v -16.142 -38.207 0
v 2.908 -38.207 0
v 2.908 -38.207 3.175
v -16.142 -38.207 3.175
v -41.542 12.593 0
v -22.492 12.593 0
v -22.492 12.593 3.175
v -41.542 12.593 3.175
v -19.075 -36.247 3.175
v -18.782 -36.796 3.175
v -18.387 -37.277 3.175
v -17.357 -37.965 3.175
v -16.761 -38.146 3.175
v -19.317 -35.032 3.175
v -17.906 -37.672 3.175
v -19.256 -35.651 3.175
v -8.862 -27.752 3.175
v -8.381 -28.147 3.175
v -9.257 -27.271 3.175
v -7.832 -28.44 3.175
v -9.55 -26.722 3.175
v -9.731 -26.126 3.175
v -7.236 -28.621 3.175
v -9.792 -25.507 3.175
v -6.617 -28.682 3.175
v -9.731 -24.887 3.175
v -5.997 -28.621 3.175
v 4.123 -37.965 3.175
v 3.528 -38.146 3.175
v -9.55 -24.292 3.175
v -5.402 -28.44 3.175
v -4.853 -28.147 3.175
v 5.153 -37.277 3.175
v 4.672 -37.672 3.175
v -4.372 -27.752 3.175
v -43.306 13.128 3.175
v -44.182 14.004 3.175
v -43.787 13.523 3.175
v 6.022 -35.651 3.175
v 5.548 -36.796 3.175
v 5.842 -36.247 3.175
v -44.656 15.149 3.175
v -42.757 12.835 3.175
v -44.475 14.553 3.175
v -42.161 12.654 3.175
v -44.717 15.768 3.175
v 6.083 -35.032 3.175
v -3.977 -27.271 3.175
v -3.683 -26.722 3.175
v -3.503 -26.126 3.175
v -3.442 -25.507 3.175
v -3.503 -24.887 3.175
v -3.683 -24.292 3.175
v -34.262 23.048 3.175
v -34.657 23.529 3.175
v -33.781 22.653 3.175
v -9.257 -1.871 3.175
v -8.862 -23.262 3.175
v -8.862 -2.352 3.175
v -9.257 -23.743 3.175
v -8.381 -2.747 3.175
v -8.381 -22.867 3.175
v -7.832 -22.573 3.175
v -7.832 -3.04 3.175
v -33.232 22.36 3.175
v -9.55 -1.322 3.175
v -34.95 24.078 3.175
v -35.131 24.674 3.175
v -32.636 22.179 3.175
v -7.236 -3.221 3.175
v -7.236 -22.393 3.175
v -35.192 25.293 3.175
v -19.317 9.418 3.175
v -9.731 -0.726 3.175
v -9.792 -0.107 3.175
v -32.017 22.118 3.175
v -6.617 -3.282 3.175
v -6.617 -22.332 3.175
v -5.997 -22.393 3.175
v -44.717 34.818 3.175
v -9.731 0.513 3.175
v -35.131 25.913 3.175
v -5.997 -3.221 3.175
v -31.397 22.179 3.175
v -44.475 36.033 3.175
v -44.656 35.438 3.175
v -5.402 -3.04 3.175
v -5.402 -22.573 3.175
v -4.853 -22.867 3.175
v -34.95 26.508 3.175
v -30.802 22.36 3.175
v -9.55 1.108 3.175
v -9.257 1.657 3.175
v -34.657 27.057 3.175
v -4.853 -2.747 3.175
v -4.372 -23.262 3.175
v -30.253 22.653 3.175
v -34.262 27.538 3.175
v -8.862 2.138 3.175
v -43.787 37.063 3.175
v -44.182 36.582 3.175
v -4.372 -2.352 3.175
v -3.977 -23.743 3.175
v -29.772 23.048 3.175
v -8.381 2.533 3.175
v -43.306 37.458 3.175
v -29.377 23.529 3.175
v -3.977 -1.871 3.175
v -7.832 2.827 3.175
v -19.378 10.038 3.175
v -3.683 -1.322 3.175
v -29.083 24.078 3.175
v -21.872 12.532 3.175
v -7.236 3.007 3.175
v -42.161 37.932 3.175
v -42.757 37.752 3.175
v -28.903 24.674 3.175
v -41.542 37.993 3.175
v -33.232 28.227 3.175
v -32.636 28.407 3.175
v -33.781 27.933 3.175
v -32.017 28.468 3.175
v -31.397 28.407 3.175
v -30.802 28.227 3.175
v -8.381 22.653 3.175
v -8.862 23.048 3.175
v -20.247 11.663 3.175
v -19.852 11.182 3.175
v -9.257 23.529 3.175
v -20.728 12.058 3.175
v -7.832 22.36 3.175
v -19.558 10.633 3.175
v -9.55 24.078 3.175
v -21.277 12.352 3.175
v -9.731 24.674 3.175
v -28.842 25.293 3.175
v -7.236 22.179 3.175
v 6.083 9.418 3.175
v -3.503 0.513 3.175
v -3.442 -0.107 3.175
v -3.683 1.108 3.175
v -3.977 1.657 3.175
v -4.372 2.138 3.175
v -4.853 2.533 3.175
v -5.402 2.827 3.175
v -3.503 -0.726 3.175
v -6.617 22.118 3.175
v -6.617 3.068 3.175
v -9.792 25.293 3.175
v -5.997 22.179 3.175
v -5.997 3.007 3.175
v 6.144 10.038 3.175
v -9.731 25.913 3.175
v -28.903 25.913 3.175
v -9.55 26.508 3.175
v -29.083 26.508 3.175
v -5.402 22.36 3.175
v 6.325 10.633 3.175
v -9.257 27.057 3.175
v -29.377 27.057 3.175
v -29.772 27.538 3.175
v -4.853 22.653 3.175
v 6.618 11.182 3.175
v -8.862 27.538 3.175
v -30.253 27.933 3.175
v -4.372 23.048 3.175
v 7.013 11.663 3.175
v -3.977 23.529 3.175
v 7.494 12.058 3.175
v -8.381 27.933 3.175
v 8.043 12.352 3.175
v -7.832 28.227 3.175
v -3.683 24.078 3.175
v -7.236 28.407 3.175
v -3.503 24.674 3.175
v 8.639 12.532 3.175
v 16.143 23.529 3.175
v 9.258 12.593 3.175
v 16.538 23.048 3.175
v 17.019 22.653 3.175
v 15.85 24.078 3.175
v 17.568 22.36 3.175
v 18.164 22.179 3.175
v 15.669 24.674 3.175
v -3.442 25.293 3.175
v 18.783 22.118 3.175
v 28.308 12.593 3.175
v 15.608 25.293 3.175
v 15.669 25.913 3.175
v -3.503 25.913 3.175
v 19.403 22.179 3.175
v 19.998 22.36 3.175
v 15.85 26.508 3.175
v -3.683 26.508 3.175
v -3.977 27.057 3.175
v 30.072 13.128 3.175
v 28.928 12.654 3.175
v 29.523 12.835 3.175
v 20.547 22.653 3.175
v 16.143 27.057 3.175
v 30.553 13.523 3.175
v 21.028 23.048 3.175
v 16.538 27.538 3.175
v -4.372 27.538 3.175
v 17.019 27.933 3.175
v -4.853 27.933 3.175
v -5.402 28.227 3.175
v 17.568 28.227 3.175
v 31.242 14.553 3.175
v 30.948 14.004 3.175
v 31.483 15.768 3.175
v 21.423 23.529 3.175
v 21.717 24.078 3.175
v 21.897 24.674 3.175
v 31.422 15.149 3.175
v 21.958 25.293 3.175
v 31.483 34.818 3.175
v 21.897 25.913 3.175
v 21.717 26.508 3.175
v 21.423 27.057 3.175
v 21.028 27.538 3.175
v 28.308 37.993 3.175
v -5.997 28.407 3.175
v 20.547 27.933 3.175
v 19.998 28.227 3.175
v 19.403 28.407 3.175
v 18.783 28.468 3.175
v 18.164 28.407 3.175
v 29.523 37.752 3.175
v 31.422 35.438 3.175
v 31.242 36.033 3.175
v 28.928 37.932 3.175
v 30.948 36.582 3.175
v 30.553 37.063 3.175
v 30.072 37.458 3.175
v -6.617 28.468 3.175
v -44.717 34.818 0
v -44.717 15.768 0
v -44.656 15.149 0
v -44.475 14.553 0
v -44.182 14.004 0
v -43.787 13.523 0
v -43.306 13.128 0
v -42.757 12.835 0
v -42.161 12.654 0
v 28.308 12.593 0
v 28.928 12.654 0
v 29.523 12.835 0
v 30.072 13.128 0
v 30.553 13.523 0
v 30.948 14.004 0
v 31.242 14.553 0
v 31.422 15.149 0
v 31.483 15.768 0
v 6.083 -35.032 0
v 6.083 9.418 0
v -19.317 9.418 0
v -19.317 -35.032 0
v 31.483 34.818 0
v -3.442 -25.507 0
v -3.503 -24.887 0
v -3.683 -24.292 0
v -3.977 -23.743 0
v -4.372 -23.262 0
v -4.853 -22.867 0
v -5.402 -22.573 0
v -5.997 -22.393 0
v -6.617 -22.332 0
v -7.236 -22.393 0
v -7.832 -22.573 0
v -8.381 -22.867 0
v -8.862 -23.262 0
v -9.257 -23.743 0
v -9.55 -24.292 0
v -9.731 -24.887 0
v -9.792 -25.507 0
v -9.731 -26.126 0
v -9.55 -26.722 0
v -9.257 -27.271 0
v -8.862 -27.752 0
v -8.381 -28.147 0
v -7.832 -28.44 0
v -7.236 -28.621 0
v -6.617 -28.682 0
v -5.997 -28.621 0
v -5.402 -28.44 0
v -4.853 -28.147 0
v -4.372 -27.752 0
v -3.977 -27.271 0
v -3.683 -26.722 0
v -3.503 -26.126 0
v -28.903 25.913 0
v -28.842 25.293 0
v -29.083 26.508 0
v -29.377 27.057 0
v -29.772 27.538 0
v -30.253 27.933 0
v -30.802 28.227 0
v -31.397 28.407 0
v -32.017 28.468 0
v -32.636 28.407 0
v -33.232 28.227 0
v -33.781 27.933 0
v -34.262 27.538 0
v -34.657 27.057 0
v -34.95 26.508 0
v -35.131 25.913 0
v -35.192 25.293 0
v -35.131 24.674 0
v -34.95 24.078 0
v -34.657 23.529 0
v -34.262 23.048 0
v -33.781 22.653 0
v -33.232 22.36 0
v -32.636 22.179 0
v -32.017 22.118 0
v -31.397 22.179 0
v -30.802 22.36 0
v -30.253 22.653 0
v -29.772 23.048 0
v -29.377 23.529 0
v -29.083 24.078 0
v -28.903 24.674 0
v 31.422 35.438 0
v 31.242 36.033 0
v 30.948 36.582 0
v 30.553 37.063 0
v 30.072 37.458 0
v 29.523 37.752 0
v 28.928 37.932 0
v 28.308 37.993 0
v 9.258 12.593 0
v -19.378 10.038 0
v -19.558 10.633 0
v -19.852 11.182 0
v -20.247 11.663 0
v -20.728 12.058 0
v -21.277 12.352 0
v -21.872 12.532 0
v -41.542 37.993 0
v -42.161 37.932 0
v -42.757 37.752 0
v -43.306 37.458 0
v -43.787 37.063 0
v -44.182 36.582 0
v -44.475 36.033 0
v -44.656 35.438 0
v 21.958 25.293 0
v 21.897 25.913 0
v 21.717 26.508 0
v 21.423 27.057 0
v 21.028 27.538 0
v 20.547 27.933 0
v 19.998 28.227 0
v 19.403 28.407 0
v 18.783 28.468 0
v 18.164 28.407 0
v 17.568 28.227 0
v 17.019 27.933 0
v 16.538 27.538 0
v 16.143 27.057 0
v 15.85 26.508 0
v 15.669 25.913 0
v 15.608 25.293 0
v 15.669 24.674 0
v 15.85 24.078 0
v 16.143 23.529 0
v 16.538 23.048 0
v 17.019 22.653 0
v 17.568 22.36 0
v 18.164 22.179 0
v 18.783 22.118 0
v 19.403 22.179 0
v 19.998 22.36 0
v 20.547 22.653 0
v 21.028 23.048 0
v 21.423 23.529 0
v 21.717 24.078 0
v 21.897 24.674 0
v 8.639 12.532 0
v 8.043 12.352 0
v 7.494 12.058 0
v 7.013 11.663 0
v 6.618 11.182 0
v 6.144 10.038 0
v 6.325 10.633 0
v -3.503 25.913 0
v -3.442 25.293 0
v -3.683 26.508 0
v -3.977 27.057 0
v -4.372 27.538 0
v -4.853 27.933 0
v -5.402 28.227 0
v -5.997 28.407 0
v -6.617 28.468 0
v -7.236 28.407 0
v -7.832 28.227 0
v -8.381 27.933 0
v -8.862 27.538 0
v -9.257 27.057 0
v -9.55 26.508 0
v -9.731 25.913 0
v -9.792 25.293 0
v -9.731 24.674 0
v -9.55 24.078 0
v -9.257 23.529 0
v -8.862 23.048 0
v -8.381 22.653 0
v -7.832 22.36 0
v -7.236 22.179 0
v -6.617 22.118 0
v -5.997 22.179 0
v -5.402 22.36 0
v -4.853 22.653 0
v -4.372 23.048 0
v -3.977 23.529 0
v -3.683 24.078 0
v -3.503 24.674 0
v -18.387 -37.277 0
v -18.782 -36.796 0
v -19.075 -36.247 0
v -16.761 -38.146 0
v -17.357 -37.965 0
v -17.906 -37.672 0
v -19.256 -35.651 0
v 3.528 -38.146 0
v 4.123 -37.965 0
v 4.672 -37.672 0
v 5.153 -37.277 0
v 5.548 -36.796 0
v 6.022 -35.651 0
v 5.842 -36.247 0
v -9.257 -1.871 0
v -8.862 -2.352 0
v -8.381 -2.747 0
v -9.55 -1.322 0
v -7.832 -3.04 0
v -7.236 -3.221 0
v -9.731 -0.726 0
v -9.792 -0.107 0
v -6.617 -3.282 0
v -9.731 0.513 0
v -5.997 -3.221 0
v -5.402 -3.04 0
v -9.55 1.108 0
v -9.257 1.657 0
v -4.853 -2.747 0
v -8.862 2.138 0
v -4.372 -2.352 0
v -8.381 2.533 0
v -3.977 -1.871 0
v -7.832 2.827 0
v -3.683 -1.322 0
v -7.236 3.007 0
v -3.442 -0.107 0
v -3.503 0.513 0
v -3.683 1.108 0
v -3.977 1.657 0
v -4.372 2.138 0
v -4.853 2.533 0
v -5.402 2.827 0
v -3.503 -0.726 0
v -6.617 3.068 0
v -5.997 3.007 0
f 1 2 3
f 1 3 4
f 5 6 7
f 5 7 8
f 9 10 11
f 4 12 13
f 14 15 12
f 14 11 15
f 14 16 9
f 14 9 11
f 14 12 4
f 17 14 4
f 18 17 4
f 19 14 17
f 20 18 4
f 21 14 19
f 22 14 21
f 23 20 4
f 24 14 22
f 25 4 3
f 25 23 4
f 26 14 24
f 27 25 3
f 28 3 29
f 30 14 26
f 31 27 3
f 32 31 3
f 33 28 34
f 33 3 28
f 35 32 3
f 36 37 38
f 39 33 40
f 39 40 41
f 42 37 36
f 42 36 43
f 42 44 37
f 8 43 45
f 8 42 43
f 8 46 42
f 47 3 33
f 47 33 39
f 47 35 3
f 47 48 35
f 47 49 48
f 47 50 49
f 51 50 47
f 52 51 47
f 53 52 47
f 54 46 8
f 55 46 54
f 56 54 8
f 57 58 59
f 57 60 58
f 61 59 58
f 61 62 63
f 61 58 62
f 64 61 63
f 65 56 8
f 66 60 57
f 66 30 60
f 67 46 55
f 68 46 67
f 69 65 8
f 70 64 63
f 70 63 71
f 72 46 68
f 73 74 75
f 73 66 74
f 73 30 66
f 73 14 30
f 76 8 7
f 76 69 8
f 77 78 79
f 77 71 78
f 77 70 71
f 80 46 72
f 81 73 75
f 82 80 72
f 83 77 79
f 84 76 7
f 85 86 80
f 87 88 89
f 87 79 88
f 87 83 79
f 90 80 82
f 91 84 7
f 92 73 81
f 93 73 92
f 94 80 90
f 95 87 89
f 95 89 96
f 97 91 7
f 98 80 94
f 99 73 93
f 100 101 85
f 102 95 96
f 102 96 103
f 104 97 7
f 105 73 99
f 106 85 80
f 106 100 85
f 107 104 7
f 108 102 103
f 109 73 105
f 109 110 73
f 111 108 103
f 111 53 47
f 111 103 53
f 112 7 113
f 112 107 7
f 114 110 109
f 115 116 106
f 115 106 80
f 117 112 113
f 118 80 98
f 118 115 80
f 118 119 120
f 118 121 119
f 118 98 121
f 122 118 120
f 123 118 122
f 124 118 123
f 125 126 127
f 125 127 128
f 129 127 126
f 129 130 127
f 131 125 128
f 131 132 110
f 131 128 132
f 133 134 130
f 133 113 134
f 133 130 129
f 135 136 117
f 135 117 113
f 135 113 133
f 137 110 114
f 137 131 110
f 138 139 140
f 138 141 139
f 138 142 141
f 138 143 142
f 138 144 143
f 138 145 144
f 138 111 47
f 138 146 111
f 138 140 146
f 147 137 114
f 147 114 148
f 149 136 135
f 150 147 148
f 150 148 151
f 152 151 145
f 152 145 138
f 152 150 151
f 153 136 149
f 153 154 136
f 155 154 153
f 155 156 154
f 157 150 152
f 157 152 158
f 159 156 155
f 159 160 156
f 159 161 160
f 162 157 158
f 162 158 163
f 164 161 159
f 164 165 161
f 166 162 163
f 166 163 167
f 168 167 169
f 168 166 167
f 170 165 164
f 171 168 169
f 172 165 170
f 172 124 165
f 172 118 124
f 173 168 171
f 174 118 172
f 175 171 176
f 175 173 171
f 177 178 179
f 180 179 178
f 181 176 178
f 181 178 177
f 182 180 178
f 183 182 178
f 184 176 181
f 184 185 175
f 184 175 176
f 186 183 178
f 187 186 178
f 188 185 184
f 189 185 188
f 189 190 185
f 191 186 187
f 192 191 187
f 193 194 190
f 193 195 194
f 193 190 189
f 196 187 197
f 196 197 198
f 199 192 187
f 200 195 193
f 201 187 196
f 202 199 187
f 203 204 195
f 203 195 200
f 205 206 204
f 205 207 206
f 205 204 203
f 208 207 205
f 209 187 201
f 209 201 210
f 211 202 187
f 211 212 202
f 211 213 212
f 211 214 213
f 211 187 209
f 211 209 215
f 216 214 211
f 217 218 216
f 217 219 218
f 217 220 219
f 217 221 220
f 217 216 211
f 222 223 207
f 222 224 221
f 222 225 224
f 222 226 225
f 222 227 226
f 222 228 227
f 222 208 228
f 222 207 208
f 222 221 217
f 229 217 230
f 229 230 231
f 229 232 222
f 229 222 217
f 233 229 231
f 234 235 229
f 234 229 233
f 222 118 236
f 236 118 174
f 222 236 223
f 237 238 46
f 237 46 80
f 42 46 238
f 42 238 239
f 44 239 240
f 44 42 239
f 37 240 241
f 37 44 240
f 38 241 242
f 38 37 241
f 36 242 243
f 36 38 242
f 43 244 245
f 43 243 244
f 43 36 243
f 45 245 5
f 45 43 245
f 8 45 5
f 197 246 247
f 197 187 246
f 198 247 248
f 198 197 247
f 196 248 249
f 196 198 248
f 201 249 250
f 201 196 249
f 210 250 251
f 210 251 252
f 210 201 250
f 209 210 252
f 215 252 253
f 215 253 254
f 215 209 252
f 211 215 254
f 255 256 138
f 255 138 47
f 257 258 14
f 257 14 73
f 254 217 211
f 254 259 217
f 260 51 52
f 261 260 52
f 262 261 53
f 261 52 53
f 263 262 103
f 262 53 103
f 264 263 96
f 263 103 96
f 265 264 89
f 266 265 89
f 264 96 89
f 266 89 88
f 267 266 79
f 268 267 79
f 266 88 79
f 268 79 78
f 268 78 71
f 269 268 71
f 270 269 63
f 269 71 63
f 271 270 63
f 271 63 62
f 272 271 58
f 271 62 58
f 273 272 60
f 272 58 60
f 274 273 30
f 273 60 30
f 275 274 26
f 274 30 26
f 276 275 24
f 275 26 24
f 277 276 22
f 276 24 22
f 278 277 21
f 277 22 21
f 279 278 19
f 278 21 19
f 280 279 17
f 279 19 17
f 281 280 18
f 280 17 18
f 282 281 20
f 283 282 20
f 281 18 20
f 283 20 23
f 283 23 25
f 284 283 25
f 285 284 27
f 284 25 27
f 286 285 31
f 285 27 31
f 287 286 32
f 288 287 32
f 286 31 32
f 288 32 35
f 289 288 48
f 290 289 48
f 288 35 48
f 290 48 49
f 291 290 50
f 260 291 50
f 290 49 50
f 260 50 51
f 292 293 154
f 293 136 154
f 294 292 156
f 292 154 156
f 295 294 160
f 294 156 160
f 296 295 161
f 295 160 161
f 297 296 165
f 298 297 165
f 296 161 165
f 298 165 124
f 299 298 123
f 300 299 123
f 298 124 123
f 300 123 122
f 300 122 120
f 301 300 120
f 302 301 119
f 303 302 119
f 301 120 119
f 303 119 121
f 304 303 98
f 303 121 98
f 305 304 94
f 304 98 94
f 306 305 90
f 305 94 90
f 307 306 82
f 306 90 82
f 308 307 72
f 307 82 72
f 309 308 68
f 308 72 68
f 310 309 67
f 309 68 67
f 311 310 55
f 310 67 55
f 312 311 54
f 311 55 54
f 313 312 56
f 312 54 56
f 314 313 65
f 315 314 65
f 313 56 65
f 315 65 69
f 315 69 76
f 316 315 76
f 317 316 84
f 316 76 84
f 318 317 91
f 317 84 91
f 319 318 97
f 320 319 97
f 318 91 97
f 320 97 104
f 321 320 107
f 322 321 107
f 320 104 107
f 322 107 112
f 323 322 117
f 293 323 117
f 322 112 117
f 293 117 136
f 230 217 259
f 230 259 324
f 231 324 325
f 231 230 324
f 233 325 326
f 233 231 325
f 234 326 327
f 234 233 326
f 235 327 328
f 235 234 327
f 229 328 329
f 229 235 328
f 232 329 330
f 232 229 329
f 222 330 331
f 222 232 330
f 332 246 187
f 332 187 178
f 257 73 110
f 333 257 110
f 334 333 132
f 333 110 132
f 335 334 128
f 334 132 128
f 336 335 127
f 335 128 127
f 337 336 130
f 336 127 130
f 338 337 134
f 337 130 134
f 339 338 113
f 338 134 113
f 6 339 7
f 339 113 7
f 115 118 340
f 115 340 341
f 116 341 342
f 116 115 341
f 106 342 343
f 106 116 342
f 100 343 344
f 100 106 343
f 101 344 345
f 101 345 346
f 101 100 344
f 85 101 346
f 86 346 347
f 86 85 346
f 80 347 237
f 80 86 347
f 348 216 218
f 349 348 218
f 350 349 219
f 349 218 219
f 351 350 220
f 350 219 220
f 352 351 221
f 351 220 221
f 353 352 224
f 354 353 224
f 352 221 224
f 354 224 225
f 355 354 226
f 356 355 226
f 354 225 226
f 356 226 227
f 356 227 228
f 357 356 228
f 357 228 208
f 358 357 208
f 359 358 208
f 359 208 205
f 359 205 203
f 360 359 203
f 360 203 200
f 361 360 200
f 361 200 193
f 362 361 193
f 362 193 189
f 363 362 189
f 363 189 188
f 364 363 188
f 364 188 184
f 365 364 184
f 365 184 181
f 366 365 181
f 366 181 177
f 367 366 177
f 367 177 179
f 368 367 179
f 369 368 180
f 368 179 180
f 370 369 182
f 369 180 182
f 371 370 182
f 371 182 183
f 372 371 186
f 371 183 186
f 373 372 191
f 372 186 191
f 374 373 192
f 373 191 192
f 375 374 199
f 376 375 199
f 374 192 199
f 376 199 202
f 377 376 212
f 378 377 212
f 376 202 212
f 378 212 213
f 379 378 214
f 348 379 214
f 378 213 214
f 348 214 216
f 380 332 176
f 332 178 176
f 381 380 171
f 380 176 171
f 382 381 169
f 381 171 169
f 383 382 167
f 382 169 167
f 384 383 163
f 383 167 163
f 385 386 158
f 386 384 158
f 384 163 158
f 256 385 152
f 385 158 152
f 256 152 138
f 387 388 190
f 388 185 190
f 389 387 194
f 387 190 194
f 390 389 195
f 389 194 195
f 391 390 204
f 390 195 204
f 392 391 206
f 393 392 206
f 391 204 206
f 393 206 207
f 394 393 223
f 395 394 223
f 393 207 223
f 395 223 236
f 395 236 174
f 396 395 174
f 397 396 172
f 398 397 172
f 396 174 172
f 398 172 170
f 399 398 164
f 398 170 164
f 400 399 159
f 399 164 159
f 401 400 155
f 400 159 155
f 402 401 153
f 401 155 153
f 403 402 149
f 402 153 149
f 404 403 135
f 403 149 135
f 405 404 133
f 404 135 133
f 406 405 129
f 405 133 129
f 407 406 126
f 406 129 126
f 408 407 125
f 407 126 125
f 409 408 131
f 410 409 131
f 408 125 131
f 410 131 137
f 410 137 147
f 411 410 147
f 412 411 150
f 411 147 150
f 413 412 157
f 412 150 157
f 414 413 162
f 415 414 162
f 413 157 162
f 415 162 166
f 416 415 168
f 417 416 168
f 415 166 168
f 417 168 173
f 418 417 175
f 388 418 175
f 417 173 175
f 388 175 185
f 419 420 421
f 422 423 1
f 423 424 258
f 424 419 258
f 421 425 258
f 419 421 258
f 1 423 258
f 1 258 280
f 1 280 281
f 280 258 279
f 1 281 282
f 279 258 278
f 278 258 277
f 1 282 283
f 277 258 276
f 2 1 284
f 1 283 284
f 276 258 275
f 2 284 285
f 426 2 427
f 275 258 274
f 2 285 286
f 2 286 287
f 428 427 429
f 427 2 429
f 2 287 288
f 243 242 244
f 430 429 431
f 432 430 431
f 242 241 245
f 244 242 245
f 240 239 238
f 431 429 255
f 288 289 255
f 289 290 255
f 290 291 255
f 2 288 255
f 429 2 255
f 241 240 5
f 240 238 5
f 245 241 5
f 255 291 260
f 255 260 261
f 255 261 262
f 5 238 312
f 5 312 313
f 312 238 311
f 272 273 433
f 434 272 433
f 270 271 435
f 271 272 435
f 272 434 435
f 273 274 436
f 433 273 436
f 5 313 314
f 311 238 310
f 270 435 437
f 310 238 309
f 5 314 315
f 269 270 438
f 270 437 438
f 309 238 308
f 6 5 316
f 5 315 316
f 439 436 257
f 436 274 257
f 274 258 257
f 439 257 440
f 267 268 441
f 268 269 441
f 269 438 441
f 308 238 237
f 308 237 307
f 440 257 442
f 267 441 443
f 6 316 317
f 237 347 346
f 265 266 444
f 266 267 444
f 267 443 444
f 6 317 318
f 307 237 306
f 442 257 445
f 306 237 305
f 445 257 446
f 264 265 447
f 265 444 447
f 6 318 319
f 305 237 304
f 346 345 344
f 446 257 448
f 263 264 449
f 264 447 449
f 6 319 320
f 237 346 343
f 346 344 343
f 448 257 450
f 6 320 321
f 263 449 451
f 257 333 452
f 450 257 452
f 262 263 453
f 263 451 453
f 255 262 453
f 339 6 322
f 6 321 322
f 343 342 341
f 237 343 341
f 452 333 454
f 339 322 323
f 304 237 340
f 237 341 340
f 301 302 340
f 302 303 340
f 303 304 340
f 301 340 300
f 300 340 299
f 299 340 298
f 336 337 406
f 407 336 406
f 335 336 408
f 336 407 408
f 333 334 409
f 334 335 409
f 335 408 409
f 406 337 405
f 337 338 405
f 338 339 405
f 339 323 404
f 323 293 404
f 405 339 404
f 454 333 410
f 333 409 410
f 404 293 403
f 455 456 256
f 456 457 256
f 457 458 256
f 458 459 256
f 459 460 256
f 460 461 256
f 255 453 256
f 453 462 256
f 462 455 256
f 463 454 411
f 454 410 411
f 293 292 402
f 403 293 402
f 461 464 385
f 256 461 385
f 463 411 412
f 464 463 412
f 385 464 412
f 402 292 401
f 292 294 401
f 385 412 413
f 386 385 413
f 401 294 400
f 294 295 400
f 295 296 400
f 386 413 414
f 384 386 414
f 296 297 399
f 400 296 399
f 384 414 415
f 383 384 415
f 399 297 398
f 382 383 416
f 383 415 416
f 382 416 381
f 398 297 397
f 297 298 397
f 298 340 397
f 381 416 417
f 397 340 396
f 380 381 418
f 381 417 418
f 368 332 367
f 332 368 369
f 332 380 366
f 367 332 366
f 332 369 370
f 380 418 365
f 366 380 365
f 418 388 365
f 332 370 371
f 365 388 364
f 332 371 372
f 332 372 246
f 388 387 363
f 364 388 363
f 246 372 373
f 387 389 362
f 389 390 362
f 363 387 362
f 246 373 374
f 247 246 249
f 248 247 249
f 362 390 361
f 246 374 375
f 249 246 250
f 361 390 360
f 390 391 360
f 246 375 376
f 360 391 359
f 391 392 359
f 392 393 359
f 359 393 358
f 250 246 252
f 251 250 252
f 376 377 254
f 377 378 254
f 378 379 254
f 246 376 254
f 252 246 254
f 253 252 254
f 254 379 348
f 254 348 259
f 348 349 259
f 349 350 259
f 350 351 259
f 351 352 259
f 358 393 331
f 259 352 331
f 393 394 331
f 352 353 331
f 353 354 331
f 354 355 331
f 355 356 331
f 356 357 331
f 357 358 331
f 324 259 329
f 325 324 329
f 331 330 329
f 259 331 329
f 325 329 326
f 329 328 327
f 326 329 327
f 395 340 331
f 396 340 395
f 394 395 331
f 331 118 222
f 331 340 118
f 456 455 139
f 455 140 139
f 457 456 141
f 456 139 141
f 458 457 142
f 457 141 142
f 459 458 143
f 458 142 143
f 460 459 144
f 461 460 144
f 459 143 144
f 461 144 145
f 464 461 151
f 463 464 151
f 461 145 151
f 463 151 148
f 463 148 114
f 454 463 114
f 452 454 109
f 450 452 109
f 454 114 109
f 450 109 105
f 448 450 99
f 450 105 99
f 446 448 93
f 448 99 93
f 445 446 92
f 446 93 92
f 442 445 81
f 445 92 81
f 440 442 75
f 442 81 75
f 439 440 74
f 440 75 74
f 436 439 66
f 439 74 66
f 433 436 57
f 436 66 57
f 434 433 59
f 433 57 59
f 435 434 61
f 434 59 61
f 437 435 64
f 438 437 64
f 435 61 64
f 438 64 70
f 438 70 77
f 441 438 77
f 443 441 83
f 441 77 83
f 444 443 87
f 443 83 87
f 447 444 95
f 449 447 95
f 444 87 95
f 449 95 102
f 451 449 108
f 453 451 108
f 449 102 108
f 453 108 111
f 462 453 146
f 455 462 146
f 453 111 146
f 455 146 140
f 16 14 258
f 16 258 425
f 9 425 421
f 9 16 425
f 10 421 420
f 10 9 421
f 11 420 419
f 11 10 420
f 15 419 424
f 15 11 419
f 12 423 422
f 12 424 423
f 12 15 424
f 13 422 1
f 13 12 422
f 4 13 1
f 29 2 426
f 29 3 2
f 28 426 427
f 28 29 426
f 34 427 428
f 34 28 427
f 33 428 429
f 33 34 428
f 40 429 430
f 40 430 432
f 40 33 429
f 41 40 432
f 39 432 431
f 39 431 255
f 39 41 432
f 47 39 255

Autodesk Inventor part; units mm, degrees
ref_plane "YZ Plane" through (0, 0, 0) normal (1, 0, 0) x (0, 1, 0)
ref_plane "XZ Plane" through (0, 0, 0) normal (0, 1, 0) x (-1, 0, 0)
ref_plane "XY Plane" through (0, 0, 0) normal (0, 0, 1) x (1, 0, 0)
sketch "Sketch1" plane through (0, 0, 0) normal (0, 0, 1) x (1, 0, 0)
  line L0 (-18.0361, 37.9933) -> (2.0277, 37.9933)
  line L1 (6.0832, 12.5933) -> (6.0832, -38.2067)
  line L2 (6.0832, -38.2067) -> (-19.3168, -38.2067)
  line L3 (-19.3168, -38.2067) -> (-19.3168, 12.5933)
  line L4 (-44.7168, 37.9933) -> (31.4832, 37.9933)
  line L5 (31.4832, 37.9933) -> (31.4832, 12.5933)
  line L6 (-44.7168, 12.5933) -> (-44.7168, 37.9933)
  line L7 (31.4832, 12.5933) -> (6.0832, 12.5933)
  line L8 (-19.3168, 12.5933) -> (-44.7168, 12.5933)
  point P0 (0, 0)
  dimension "d0" = 76.2
  dimension "d1" = 25.4
  dimension "d2" = 25.4
  dimension "d3" = 25.4
  dimension "d4" = 50.8
  dimension "d5" = 25.4
extrude "Extrusion1" add sketch "Sketch1" along normal blind 3.175
fillet "Fillet1" radius 3.175 3 edges at (-44.7168, 12.5933, 1.5875) (-19.3168, 12.5933, 1.5875) (-19.3168, -38.2067, 1.5875)
fillet "Fillet2" radius 3.175 1 edges at (6.0832, -38.2067, 1.5875)
fillet "Fillet3" radius 3.175 3 edges at (6.0832, 12.5933, 1.5875) (31.4832, 12.5933, 1.5875) (31.4832, 37.9933, 1.5875)
fillet "Fillet4" radius 3.175 1 edges at (-44.7168, 37.9933, 1.5875)
sketch "Sketch2" plane through (0, 0, 3.175) normal (0, 0, 1) x (1, 0, 0)
  line L0 (31.4832, 15.7683) -> (31.4832, 34.8183) projected
  line L1 (31.4832, 25.2933) -> (-44.7168, 25.2933) construction
  line L2 (-44.7168, 34.8183) -> (-44.7168, 15.7683) projected
  line L3 (28.3082, 37.9933) -> (-41.5418, 37.9933) projected
  line L4 (-6.6168, 37.9933) -> (-6.6168, -38.2067) construction
  line L5 (-16.1418, -38.2067) -> (2.9082, -38.2067) projected
  circle A0 centre (18.7832, 25.2933) radius 3.175
  circle A1 centre (-6.6168, 25.2933) radius 3.175
  circle A2 centre (-32.0168, 25.2933) radius 3.175
  circle A3 centre (-6.6168, -0.1067) radius 3.175
  circle A4 centre (-6.6168, -25.5067) radius 3.175
  point P0 (0, 0)
  dimension "d12" = 6.35
  dimension "d13" = 12.7
  dimension "d16" = 25.4
  dimension "d23" = 25.4
extrude "Extrusion2" cut sketch "Sketch2" against normal through all
properties part number "Frame T Gussets"
